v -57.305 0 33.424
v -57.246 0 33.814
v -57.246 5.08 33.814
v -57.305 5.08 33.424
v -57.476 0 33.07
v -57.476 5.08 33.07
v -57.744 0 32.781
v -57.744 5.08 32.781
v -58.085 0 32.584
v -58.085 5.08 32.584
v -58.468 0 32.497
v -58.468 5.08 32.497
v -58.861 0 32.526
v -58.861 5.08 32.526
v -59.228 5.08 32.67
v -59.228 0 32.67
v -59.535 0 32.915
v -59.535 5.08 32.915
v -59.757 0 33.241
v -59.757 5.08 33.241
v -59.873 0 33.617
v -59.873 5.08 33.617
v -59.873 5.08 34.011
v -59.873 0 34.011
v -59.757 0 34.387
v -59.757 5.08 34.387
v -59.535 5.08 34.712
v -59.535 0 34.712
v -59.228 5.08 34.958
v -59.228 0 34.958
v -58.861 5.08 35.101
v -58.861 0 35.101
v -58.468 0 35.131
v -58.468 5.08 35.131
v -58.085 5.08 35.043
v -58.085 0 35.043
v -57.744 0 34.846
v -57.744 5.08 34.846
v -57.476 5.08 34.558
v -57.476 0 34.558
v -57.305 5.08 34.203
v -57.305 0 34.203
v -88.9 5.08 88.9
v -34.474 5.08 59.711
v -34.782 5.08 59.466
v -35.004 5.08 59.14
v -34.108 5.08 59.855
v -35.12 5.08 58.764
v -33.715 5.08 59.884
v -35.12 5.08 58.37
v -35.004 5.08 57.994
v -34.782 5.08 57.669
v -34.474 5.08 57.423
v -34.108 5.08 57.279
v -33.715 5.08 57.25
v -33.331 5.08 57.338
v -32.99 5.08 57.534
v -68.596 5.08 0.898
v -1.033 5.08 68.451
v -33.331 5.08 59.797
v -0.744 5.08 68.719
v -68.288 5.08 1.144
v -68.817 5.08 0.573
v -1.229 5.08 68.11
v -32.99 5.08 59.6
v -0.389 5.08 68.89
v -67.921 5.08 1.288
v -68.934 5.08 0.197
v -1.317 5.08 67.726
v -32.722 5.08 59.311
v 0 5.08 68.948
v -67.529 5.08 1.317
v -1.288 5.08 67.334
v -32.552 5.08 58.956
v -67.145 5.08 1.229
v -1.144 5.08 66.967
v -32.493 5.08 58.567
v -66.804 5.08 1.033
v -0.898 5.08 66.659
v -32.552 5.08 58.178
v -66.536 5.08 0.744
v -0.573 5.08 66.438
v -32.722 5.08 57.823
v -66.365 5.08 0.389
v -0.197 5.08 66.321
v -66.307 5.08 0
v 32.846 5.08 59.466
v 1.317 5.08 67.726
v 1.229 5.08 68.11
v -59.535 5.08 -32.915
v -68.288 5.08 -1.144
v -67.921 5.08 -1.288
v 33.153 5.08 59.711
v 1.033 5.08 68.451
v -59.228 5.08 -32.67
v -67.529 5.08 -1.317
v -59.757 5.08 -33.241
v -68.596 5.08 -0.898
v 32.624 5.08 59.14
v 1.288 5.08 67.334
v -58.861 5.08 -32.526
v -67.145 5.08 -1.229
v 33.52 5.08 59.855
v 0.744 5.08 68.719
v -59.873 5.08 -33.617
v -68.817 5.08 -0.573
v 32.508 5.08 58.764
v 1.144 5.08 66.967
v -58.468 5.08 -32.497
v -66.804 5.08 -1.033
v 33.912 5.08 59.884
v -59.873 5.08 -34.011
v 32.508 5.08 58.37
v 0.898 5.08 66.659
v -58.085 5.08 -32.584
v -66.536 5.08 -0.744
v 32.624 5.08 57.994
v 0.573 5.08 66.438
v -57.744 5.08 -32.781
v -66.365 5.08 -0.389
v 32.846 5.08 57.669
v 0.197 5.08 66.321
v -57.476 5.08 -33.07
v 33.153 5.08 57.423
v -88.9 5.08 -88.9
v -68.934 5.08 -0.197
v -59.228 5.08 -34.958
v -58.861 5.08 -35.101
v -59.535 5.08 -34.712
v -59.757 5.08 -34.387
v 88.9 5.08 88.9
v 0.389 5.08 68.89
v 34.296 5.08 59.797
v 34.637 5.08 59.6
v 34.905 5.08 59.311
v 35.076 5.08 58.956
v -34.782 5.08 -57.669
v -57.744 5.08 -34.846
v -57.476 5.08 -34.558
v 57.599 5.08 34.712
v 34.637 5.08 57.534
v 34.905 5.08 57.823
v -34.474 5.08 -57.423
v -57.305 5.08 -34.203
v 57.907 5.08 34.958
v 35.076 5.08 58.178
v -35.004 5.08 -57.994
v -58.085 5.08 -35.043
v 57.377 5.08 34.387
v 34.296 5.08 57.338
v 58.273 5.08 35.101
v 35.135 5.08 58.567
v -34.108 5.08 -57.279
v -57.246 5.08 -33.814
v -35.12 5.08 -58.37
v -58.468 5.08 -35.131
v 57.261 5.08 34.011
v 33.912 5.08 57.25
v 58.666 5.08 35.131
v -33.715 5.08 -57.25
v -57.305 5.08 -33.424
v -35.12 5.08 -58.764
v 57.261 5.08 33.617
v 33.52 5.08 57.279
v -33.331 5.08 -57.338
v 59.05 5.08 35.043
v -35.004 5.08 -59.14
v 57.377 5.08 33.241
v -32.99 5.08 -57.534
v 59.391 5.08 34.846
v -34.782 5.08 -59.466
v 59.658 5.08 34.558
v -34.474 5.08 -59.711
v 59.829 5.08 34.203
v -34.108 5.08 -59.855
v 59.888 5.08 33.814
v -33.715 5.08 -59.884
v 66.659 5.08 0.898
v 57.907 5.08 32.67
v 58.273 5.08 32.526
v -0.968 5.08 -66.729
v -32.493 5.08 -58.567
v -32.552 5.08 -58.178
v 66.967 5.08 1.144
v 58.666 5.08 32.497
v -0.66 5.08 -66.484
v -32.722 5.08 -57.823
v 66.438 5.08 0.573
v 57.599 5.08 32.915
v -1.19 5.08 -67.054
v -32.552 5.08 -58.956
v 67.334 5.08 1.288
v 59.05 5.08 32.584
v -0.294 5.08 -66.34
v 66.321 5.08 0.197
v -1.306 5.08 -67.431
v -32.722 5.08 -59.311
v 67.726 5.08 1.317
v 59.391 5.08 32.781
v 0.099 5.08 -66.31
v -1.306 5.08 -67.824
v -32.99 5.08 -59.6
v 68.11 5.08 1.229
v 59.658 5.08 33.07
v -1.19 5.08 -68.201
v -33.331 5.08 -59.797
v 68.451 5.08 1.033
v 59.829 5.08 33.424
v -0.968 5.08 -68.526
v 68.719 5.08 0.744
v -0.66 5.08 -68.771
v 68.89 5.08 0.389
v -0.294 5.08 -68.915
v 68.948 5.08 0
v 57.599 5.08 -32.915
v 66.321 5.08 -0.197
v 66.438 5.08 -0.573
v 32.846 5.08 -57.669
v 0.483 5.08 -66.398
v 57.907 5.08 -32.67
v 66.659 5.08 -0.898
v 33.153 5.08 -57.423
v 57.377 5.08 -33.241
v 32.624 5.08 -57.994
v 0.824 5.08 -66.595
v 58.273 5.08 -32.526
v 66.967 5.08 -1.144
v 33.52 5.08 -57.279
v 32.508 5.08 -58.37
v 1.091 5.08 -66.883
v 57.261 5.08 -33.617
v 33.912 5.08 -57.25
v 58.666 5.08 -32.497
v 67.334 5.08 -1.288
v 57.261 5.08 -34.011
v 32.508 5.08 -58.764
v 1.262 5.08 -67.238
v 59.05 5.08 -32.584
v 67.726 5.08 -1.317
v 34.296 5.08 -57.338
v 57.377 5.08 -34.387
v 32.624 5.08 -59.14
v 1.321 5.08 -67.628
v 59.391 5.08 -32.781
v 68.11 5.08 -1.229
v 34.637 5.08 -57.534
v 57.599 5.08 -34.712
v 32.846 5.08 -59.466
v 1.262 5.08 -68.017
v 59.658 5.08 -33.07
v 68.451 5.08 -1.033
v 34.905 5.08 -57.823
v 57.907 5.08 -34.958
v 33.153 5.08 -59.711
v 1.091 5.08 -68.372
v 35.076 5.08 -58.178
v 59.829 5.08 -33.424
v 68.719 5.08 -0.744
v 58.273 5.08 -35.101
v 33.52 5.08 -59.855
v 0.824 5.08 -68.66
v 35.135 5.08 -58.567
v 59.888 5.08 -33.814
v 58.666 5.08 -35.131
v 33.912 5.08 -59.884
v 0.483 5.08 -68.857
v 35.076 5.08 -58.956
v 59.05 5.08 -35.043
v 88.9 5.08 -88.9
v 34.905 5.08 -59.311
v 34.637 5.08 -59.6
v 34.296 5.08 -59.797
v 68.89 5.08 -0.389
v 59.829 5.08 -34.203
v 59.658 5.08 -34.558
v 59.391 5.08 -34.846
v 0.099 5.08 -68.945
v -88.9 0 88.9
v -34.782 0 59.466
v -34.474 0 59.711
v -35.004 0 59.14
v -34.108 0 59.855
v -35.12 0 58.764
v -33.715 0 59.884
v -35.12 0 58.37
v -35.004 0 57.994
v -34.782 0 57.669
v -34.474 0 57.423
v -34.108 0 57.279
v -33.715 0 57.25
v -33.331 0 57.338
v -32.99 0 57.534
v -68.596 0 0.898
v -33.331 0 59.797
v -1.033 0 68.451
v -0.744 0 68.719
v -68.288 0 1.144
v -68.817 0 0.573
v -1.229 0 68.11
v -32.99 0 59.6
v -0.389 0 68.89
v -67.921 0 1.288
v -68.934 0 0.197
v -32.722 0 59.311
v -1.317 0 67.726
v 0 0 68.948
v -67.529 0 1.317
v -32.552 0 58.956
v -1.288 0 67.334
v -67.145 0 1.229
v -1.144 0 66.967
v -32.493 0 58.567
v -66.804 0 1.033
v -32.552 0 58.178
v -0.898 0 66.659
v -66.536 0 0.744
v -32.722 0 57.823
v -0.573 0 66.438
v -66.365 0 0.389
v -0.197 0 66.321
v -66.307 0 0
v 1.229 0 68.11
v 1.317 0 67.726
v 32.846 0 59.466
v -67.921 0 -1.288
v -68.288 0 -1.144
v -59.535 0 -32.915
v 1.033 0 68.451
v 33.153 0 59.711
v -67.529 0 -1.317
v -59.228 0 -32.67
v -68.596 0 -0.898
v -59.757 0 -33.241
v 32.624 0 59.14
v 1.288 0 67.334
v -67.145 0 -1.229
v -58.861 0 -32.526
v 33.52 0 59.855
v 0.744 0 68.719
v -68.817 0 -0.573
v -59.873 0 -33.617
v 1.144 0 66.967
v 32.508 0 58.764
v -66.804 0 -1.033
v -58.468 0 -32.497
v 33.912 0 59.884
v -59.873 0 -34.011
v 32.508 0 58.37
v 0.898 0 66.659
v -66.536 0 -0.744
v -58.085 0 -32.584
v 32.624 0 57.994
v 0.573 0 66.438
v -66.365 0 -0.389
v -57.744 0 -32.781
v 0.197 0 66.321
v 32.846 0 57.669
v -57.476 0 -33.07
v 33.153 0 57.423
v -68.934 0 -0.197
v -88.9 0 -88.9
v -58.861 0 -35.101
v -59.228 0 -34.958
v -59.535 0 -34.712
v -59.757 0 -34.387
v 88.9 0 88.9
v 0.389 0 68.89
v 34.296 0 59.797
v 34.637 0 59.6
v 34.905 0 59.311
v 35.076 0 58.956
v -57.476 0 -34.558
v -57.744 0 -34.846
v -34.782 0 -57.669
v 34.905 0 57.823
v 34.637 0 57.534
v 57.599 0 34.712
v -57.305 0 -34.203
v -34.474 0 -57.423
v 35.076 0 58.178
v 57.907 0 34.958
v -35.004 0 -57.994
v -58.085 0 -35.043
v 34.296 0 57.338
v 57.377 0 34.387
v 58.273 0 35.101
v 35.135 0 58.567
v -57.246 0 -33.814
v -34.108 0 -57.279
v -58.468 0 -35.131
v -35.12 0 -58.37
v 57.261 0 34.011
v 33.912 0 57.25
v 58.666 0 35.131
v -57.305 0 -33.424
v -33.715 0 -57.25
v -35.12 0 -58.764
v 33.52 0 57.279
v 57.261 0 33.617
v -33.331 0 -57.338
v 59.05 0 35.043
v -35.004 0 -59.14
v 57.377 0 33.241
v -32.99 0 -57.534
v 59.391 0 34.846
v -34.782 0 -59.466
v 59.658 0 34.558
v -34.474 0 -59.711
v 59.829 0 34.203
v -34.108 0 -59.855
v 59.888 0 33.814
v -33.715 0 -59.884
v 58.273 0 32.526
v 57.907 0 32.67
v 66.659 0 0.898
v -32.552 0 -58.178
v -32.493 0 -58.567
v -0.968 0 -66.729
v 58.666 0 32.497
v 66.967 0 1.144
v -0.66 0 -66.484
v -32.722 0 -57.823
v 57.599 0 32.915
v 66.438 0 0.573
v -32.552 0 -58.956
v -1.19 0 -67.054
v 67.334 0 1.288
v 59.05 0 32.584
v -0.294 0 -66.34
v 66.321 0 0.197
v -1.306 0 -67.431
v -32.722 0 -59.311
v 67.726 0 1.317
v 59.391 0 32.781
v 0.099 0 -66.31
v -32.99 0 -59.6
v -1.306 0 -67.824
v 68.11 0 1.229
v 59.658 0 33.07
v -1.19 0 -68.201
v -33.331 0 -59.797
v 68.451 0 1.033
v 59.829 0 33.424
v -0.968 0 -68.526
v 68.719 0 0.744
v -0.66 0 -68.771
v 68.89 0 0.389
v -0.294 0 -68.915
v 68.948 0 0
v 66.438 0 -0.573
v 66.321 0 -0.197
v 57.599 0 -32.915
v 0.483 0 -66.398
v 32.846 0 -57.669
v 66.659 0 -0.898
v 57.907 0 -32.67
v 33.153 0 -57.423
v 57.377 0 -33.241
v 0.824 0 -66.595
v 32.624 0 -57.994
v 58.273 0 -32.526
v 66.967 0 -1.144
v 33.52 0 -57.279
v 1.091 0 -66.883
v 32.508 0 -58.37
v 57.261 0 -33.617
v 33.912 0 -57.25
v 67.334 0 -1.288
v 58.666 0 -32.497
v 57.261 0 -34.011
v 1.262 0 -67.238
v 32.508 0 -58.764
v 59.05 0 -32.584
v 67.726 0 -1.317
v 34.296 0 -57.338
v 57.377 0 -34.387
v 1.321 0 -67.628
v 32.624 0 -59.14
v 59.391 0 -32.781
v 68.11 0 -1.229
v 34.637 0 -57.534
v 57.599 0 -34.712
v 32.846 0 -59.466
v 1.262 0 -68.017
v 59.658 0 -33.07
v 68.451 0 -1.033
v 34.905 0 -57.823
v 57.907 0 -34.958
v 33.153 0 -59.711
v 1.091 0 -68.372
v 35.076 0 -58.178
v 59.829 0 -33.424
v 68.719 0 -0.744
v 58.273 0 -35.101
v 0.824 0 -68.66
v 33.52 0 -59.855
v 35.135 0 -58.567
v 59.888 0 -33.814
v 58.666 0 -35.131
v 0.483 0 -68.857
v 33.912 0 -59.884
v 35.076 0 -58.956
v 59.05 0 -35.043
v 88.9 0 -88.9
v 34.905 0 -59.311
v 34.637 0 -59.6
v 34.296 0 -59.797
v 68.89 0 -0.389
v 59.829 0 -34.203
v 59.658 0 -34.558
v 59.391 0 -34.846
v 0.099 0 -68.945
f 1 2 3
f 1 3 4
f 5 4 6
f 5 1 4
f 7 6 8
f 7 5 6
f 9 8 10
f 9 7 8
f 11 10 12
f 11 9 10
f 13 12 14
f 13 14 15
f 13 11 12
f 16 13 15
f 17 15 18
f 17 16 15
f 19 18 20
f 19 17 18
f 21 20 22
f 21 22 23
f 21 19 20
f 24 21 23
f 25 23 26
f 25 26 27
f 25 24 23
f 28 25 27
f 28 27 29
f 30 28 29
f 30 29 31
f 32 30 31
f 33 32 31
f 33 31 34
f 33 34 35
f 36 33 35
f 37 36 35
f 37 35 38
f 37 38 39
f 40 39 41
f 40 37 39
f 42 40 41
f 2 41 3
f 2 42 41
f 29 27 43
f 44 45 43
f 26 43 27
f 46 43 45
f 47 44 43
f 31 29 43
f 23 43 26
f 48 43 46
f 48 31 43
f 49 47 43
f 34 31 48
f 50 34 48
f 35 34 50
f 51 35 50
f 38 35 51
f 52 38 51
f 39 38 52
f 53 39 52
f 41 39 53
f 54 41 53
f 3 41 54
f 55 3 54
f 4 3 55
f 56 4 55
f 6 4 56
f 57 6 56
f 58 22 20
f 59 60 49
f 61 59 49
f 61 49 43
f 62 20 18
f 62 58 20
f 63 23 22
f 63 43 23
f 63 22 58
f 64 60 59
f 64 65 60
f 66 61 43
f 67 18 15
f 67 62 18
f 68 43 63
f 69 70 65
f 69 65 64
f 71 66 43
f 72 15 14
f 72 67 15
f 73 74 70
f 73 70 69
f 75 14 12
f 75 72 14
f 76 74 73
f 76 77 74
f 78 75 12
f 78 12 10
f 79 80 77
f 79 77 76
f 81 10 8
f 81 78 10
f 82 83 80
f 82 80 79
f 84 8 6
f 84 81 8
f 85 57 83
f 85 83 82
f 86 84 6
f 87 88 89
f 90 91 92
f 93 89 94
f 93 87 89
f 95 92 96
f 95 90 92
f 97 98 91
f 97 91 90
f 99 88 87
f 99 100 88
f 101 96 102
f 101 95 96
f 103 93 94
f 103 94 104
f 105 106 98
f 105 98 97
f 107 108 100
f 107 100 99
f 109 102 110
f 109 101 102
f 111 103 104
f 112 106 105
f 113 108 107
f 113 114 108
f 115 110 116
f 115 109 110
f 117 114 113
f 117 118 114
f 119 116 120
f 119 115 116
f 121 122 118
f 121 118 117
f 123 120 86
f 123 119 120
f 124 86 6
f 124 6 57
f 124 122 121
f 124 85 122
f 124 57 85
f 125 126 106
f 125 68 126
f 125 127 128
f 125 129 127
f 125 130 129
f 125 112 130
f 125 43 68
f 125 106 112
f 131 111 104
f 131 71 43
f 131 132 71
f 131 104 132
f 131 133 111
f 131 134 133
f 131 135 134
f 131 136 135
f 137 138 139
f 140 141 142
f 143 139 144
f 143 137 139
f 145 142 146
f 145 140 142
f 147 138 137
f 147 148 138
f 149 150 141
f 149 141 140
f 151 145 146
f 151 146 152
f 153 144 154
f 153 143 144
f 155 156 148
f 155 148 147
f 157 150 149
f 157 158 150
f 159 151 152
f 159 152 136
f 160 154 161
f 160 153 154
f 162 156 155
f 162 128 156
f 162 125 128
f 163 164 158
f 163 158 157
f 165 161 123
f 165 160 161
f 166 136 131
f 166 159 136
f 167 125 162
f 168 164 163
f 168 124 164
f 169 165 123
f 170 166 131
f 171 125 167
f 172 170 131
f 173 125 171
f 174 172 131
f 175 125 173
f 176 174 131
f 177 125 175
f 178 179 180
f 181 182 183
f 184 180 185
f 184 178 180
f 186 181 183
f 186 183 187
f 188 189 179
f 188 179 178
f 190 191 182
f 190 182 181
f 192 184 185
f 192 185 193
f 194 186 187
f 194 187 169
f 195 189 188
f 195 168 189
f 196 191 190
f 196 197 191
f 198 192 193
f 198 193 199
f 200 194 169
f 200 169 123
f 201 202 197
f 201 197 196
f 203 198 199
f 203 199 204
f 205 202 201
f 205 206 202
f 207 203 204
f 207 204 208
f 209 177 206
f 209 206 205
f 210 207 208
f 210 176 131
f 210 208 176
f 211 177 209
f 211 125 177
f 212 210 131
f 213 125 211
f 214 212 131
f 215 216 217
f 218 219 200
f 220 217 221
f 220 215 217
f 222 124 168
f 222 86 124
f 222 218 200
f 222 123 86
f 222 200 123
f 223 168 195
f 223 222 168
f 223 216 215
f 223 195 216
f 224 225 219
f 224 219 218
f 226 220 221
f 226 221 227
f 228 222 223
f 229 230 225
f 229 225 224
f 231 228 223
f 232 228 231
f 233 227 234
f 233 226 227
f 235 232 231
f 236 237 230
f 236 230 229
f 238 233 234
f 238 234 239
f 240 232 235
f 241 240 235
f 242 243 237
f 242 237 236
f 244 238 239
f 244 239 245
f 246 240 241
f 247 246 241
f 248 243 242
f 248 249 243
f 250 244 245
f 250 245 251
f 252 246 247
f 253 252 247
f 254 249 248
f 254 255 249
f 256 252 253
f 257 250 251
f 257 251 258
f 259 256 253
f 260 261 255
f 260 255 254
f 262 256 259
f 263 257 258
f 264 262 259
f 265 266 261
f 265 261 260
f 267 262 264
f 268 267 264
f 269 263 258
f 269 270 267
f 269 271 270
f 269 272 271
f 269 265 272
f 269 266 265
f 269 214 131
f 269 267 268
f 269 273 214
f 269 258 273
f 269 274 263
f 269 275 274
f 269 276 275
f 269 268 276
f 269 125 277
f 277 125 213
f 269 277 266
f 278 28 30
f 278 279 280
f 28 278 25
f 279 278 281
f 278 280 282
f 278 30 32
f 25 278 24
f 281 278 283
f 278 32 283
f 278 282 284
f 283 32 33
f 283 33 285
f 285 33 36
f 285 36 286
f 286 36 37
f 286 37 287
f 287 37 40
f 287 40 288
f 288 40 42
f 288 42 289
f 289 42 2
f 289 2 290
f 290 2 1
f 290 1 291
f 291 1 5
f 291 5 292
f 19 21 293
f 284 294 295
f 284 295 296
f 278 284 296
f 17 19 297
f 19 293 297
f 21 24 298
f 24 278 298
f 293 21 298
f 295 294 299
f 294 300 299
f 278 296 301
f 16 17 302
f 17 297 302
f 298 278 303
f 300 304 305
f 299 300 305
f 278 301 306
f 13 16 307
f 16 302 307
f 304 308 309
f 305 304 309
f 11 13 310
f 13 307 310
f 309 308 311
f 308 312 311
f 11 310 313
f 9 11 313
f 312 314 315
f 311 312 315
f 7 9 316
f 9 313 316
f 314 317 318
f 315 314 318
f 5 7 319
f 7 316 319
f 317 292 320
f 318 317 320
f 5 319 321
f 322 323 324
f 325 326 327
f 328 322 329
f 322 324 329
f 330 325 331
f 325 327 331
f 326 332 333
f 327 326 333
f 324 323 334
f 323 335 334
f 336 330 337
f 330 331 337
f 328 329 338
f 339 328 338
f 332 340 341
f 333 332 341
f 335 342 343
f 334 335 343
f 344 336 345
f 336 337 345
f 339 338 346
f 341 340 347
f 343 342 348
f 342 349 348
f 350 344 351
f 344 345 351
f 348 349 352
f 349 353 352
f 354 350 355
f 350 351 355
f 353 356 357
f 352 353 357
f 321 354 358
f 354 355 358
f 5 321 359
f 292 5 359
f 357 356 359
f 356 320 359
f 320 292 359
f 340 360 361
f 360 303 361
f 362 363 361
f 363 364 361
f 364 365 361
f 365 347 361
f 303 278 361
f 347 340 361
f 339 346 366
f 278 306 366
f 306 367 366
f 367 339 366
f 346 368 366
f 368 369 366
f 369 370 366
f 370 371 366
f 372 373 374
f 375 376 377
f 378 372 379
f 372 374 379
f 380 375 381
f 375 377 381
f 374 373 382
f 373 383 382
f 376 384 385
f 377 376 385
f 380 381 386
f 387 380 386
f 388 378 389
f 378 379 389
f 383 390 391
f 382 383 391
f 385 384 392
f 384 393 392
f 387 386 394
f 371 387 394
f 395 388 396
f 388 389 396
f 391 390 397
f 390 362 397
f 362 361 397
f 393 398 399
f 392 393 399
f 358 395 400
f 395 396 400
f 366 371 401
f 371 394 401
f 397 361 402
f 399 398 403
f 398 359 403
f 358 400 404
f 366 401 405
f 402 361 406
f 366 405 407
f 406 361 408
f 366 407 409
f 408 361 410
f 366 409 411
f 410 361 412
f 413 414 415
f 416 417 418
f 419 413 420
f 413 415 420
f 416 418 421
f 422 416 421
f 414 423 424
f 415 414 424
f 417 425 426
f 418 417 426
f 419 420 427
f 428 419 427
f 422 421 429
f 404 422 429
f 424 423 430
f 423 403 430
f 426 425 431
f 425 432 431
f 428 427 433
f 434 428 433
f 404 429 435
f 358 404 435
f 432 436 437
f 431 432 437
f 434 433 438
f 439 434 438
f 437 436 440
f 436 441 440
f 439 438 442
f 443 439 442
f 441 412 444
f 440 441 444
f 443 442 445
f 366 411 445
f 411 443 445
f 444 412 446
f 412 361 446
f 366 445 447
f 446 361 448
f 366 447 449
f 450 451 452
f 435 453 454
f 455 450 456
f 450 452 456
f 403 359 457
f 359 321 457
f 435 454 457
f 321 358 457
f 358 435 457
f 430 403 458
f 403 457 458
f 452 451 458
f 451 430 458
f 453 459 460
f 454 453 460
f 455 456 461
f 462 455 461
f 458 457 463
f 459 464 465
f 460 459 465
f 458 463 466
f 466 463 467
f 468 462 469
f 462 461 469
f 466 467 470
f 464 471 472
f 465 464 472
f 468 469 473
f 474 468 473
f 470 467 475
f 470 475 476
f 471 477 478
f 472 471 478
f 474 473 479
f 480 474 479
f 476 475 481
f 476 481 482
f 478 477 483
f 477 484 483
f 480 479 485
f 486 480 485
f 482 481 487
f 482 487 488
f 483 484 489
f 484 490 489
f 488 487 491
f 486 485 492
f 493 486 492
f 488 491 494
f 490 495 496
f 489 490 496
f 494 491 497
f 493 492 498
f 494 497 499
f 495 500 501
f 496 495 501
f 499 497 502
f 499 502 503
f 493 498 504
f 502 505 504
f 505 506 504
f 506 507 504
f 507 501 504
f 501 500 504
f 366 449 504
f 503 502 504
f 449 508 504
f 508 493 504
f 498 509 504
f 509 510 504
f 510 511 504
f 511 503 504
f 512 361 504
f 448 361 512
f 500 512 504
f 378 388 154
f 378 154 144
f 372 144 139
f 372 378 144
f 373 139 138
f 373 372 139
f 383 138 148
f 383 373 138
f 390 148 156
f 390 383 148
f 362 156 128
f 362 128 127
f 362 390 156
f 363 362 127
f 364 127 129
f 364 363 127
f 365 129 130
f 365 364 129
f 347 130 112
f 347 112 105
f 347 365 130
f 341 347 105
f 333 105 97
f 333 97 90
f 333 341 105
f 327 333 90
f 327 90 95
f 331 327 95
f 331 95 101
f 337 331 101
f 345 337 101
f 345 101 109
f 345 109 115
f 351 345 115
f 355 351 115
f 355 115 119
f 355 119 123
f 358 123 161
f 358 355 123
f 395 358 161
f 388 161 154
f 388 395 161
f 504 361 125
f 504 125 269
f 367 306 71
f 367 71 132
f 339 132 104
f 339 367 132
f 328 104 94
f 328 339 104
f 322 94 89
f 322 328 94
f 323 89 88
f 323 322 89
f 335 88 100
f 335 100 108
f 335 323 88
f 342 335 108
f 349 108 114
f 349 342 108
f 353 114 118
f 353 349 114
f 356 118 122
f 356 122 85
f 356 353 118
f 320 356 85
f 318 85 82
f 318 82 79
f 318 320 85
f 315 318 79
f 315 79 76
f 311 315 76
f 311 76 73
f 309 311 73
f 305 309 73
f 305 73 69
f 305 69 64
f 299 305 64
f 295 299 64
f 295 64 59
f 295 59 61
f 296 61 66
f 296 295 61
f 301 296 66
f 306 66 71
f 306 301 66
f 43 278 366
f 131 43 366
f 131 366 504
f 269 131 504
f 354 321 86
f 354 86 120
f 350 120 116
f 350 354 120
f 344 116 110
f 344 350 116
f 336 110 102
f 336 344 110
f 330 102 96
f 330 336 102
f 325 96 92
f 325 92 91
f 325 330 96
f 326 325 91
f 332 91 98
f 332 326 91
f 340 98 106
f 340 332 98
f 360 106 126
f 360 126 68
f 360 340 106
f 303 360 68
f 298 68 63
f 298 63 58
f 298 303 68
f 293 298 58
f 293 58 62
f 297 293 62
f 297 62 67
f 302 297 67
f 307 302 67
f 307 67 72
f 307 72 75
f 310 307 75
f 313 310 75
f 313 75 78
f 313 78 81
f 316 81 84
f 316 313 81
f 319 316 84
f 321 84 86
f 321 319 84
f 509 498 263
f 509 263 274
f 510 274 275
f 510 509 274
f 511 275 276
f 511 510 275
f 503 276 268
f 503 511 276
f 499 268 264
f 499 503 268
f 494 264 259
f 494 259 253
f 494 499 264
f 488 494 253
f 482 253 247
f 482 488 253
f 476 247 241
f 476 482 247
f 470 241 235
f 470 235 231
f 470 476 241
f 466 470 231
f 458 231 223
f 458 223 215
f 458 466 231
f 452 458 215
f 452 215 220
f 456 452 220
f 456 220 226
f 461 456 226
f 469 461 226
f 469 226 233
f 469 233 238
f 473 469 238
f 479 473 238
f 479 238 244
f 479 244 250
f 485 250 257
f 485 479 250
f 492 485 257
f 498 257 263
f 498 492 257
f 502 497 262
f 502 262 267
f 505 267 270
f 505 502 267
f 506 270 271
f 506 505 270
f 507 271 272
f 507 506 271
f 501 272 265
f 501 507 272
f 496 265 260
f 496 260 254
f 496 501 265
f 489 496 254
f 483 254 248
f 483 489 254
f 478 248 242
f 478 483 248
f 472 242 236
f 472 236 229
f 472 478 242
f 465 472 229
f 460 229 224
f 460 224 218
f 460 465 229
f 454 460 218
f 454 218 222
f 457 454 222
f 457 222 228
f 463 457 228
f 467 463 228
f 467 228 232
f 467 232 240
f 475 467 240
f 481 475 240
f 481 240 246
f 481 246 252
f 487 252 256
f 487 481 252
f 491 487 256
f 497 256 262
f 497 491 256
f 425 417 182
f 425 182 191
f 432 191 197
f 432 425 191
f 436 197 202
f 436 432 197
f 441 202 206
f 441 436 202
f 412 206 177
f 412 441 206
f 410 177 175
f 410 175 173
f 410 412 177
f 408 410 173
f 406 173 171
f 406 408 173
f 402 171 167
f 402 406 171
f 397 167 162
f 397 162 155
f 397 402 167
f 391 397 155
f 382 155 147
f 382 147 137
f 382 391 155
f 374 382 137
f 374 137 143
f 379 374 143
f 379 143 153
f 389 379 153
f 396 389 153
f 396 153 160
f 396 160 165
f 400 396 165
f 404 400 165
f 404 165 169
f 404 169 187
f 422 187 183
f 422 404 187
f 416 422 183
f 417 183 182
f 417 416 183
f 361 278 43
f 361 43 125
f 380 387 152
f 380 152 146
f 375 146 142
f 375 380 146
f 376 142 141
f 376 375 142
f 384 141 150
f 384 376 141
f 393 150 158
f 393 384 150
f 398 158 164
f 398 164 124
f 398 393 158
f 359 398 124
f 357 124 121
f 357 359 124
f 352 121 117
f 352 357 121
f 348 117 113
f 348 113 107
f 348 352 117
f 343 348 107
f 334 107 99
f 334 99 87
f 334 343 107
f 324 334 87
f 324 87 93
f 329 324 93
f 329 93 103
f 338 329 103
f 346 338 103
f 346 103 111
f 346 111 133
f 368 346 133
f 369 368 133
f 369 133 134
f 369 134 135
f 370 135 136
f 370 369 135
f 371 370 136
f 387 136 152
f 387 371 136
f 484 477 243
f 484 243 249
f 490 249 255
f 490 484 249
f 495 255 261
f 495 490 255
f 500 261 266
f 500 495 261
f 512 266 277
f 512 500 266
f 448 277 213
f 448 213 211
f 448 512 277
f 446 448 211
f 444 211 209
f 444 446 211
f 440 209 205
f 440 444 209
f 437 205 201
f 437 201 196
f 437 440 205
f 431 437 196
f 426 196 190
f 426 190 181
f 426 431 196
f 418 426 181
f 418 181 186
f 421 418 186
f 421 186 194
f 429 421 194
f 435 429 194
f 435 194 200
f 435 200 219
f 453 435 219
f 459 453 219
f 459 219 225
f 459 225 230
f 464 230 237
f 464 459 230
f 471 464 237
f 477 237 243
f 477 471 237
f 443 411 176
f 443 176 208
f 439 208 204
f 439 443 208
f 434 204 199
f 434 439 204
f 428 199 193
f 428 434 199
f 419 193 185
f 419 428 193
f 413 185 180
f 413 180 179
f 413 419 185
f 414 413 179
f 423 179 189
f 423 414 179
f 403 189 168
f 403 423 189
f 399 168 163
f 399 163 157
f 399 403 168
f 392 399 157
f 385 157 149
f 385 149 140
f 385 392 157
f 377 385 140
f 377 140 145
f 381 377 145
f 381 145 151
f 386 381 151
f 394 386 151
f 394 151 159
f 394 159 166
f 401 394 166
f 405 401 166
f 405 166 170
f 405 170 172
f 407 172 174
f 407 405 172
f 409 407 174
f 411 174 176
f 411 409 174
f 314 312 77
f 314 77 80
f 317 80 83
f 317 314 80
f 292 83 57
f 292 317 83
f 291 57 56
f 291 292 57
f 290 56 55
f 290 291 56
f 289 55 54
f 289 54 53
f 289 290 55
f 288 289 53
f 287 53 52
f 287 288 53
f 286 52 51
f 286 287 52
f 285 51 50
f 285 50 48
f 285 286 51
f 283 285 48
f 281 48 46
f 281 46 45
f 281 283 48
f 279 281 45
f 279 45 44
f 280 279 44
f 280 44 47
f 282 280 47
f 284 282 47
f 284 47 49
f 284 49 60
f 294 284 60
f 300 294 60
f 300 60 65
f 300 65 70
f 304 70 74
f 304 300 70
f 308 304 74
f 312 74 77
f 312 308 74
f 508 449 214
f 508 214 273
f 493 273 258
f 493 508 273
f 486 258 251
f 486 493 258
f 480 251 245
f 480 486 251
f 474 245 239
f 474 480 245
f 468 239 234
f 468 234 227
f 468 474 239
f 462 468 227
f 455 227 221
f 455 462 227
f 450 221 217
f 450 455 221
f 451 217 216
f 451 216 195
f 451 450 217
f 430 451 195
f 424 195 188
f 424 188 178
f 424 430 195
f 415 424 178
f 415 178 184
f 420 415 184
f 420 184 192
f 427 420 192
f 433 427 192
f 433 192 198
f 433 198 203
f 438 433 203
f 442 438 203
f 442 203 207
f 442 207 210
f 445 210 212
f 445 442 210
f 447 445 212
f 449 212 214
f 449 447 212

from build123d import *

# Parameters (mm, degrees)
SKETCH1_W             = 177.8
SKETCH1_H             = 177.8
SKETCH1_R             = 1.3208
BOSS_EXTRUDE1_DEPTH   = 5.08
CIRPATTERN1_OUTLINE_R = 1.3208
CIRPATTERN1_DEPTH     = 5.08


# Read off the part's stored shape, not the designer's step: CirPattern1
with BuildPart() as part:
    # Sketch1 → Boss-Extrude1 (new body)
    with BuildSketch(Plane(origin=(0, 0, 0), x_dir=(1, 0, 0), z_dir=(0, 1, 0))):
        Rectangle(SKETCH1_W, SKETCH1_H)
        with Locations(Location((0, -67.6275, 0), (0, 0, 270))):
            Circle(SKETCH1_R, mode=Mode.SUBTRACT)
    extrude(amount=BOSS_EXTRUDE1_DEPTH)

    # CirPattern1 outline → CirPattern1 (cut)
    with BuildSketch(Plane(origin=(0, 0, 0), x_dir=(1, 0, 0), z_dir=(0, 1, 0))):
        with Locations((33.81375, -58.567132994)):
            Circle(CIRPATTERN1_OUTLINE_R)
        with Locations((58.567132994, -33.81375)):
            Circle(CIRPATTERN1_OUTLINE_R)
        with Locations((67.6275, 0)):
            Circle(CIRPATTERN1_OUTLINE_R)
        with Locations((58.567132994, 33.81375)):
            Circle(CIRPATTERN1_OUTLINE_R)
        with Locations((33.81375, 58.567132994)):
            Circle(CIRPATTERN1_OUTLINE_R)
        with Locations((0, 67.6275)):
            Circle(CIRPATTERN1_OUTLINE_R)
        with Locations((-33.81375, 58.567132994)):
            Circle(CIRPATTERN1_OUTLINE_R)
        with Locations((-58.567132994, 33.81375)):
            Circle(CIRPATTERN1_OUTLINE_R)
        with Locations((-67.6275, 0)):
            Circle(CIRPATTERN1_OUTLINE_R)
        with Locations((-58.567132994, -33.81375)):
            Circle(CIRPATTERN1_OUTLINE_R)
        with Locations((-33.81375, -58.567132994)):
            Circle(CIRPATTERN1_OUTLINE_R)
    extrude(amount=CIRPATTERN1_DEPTH, mode=Mode.SUBTRACT)


solid = part.part
